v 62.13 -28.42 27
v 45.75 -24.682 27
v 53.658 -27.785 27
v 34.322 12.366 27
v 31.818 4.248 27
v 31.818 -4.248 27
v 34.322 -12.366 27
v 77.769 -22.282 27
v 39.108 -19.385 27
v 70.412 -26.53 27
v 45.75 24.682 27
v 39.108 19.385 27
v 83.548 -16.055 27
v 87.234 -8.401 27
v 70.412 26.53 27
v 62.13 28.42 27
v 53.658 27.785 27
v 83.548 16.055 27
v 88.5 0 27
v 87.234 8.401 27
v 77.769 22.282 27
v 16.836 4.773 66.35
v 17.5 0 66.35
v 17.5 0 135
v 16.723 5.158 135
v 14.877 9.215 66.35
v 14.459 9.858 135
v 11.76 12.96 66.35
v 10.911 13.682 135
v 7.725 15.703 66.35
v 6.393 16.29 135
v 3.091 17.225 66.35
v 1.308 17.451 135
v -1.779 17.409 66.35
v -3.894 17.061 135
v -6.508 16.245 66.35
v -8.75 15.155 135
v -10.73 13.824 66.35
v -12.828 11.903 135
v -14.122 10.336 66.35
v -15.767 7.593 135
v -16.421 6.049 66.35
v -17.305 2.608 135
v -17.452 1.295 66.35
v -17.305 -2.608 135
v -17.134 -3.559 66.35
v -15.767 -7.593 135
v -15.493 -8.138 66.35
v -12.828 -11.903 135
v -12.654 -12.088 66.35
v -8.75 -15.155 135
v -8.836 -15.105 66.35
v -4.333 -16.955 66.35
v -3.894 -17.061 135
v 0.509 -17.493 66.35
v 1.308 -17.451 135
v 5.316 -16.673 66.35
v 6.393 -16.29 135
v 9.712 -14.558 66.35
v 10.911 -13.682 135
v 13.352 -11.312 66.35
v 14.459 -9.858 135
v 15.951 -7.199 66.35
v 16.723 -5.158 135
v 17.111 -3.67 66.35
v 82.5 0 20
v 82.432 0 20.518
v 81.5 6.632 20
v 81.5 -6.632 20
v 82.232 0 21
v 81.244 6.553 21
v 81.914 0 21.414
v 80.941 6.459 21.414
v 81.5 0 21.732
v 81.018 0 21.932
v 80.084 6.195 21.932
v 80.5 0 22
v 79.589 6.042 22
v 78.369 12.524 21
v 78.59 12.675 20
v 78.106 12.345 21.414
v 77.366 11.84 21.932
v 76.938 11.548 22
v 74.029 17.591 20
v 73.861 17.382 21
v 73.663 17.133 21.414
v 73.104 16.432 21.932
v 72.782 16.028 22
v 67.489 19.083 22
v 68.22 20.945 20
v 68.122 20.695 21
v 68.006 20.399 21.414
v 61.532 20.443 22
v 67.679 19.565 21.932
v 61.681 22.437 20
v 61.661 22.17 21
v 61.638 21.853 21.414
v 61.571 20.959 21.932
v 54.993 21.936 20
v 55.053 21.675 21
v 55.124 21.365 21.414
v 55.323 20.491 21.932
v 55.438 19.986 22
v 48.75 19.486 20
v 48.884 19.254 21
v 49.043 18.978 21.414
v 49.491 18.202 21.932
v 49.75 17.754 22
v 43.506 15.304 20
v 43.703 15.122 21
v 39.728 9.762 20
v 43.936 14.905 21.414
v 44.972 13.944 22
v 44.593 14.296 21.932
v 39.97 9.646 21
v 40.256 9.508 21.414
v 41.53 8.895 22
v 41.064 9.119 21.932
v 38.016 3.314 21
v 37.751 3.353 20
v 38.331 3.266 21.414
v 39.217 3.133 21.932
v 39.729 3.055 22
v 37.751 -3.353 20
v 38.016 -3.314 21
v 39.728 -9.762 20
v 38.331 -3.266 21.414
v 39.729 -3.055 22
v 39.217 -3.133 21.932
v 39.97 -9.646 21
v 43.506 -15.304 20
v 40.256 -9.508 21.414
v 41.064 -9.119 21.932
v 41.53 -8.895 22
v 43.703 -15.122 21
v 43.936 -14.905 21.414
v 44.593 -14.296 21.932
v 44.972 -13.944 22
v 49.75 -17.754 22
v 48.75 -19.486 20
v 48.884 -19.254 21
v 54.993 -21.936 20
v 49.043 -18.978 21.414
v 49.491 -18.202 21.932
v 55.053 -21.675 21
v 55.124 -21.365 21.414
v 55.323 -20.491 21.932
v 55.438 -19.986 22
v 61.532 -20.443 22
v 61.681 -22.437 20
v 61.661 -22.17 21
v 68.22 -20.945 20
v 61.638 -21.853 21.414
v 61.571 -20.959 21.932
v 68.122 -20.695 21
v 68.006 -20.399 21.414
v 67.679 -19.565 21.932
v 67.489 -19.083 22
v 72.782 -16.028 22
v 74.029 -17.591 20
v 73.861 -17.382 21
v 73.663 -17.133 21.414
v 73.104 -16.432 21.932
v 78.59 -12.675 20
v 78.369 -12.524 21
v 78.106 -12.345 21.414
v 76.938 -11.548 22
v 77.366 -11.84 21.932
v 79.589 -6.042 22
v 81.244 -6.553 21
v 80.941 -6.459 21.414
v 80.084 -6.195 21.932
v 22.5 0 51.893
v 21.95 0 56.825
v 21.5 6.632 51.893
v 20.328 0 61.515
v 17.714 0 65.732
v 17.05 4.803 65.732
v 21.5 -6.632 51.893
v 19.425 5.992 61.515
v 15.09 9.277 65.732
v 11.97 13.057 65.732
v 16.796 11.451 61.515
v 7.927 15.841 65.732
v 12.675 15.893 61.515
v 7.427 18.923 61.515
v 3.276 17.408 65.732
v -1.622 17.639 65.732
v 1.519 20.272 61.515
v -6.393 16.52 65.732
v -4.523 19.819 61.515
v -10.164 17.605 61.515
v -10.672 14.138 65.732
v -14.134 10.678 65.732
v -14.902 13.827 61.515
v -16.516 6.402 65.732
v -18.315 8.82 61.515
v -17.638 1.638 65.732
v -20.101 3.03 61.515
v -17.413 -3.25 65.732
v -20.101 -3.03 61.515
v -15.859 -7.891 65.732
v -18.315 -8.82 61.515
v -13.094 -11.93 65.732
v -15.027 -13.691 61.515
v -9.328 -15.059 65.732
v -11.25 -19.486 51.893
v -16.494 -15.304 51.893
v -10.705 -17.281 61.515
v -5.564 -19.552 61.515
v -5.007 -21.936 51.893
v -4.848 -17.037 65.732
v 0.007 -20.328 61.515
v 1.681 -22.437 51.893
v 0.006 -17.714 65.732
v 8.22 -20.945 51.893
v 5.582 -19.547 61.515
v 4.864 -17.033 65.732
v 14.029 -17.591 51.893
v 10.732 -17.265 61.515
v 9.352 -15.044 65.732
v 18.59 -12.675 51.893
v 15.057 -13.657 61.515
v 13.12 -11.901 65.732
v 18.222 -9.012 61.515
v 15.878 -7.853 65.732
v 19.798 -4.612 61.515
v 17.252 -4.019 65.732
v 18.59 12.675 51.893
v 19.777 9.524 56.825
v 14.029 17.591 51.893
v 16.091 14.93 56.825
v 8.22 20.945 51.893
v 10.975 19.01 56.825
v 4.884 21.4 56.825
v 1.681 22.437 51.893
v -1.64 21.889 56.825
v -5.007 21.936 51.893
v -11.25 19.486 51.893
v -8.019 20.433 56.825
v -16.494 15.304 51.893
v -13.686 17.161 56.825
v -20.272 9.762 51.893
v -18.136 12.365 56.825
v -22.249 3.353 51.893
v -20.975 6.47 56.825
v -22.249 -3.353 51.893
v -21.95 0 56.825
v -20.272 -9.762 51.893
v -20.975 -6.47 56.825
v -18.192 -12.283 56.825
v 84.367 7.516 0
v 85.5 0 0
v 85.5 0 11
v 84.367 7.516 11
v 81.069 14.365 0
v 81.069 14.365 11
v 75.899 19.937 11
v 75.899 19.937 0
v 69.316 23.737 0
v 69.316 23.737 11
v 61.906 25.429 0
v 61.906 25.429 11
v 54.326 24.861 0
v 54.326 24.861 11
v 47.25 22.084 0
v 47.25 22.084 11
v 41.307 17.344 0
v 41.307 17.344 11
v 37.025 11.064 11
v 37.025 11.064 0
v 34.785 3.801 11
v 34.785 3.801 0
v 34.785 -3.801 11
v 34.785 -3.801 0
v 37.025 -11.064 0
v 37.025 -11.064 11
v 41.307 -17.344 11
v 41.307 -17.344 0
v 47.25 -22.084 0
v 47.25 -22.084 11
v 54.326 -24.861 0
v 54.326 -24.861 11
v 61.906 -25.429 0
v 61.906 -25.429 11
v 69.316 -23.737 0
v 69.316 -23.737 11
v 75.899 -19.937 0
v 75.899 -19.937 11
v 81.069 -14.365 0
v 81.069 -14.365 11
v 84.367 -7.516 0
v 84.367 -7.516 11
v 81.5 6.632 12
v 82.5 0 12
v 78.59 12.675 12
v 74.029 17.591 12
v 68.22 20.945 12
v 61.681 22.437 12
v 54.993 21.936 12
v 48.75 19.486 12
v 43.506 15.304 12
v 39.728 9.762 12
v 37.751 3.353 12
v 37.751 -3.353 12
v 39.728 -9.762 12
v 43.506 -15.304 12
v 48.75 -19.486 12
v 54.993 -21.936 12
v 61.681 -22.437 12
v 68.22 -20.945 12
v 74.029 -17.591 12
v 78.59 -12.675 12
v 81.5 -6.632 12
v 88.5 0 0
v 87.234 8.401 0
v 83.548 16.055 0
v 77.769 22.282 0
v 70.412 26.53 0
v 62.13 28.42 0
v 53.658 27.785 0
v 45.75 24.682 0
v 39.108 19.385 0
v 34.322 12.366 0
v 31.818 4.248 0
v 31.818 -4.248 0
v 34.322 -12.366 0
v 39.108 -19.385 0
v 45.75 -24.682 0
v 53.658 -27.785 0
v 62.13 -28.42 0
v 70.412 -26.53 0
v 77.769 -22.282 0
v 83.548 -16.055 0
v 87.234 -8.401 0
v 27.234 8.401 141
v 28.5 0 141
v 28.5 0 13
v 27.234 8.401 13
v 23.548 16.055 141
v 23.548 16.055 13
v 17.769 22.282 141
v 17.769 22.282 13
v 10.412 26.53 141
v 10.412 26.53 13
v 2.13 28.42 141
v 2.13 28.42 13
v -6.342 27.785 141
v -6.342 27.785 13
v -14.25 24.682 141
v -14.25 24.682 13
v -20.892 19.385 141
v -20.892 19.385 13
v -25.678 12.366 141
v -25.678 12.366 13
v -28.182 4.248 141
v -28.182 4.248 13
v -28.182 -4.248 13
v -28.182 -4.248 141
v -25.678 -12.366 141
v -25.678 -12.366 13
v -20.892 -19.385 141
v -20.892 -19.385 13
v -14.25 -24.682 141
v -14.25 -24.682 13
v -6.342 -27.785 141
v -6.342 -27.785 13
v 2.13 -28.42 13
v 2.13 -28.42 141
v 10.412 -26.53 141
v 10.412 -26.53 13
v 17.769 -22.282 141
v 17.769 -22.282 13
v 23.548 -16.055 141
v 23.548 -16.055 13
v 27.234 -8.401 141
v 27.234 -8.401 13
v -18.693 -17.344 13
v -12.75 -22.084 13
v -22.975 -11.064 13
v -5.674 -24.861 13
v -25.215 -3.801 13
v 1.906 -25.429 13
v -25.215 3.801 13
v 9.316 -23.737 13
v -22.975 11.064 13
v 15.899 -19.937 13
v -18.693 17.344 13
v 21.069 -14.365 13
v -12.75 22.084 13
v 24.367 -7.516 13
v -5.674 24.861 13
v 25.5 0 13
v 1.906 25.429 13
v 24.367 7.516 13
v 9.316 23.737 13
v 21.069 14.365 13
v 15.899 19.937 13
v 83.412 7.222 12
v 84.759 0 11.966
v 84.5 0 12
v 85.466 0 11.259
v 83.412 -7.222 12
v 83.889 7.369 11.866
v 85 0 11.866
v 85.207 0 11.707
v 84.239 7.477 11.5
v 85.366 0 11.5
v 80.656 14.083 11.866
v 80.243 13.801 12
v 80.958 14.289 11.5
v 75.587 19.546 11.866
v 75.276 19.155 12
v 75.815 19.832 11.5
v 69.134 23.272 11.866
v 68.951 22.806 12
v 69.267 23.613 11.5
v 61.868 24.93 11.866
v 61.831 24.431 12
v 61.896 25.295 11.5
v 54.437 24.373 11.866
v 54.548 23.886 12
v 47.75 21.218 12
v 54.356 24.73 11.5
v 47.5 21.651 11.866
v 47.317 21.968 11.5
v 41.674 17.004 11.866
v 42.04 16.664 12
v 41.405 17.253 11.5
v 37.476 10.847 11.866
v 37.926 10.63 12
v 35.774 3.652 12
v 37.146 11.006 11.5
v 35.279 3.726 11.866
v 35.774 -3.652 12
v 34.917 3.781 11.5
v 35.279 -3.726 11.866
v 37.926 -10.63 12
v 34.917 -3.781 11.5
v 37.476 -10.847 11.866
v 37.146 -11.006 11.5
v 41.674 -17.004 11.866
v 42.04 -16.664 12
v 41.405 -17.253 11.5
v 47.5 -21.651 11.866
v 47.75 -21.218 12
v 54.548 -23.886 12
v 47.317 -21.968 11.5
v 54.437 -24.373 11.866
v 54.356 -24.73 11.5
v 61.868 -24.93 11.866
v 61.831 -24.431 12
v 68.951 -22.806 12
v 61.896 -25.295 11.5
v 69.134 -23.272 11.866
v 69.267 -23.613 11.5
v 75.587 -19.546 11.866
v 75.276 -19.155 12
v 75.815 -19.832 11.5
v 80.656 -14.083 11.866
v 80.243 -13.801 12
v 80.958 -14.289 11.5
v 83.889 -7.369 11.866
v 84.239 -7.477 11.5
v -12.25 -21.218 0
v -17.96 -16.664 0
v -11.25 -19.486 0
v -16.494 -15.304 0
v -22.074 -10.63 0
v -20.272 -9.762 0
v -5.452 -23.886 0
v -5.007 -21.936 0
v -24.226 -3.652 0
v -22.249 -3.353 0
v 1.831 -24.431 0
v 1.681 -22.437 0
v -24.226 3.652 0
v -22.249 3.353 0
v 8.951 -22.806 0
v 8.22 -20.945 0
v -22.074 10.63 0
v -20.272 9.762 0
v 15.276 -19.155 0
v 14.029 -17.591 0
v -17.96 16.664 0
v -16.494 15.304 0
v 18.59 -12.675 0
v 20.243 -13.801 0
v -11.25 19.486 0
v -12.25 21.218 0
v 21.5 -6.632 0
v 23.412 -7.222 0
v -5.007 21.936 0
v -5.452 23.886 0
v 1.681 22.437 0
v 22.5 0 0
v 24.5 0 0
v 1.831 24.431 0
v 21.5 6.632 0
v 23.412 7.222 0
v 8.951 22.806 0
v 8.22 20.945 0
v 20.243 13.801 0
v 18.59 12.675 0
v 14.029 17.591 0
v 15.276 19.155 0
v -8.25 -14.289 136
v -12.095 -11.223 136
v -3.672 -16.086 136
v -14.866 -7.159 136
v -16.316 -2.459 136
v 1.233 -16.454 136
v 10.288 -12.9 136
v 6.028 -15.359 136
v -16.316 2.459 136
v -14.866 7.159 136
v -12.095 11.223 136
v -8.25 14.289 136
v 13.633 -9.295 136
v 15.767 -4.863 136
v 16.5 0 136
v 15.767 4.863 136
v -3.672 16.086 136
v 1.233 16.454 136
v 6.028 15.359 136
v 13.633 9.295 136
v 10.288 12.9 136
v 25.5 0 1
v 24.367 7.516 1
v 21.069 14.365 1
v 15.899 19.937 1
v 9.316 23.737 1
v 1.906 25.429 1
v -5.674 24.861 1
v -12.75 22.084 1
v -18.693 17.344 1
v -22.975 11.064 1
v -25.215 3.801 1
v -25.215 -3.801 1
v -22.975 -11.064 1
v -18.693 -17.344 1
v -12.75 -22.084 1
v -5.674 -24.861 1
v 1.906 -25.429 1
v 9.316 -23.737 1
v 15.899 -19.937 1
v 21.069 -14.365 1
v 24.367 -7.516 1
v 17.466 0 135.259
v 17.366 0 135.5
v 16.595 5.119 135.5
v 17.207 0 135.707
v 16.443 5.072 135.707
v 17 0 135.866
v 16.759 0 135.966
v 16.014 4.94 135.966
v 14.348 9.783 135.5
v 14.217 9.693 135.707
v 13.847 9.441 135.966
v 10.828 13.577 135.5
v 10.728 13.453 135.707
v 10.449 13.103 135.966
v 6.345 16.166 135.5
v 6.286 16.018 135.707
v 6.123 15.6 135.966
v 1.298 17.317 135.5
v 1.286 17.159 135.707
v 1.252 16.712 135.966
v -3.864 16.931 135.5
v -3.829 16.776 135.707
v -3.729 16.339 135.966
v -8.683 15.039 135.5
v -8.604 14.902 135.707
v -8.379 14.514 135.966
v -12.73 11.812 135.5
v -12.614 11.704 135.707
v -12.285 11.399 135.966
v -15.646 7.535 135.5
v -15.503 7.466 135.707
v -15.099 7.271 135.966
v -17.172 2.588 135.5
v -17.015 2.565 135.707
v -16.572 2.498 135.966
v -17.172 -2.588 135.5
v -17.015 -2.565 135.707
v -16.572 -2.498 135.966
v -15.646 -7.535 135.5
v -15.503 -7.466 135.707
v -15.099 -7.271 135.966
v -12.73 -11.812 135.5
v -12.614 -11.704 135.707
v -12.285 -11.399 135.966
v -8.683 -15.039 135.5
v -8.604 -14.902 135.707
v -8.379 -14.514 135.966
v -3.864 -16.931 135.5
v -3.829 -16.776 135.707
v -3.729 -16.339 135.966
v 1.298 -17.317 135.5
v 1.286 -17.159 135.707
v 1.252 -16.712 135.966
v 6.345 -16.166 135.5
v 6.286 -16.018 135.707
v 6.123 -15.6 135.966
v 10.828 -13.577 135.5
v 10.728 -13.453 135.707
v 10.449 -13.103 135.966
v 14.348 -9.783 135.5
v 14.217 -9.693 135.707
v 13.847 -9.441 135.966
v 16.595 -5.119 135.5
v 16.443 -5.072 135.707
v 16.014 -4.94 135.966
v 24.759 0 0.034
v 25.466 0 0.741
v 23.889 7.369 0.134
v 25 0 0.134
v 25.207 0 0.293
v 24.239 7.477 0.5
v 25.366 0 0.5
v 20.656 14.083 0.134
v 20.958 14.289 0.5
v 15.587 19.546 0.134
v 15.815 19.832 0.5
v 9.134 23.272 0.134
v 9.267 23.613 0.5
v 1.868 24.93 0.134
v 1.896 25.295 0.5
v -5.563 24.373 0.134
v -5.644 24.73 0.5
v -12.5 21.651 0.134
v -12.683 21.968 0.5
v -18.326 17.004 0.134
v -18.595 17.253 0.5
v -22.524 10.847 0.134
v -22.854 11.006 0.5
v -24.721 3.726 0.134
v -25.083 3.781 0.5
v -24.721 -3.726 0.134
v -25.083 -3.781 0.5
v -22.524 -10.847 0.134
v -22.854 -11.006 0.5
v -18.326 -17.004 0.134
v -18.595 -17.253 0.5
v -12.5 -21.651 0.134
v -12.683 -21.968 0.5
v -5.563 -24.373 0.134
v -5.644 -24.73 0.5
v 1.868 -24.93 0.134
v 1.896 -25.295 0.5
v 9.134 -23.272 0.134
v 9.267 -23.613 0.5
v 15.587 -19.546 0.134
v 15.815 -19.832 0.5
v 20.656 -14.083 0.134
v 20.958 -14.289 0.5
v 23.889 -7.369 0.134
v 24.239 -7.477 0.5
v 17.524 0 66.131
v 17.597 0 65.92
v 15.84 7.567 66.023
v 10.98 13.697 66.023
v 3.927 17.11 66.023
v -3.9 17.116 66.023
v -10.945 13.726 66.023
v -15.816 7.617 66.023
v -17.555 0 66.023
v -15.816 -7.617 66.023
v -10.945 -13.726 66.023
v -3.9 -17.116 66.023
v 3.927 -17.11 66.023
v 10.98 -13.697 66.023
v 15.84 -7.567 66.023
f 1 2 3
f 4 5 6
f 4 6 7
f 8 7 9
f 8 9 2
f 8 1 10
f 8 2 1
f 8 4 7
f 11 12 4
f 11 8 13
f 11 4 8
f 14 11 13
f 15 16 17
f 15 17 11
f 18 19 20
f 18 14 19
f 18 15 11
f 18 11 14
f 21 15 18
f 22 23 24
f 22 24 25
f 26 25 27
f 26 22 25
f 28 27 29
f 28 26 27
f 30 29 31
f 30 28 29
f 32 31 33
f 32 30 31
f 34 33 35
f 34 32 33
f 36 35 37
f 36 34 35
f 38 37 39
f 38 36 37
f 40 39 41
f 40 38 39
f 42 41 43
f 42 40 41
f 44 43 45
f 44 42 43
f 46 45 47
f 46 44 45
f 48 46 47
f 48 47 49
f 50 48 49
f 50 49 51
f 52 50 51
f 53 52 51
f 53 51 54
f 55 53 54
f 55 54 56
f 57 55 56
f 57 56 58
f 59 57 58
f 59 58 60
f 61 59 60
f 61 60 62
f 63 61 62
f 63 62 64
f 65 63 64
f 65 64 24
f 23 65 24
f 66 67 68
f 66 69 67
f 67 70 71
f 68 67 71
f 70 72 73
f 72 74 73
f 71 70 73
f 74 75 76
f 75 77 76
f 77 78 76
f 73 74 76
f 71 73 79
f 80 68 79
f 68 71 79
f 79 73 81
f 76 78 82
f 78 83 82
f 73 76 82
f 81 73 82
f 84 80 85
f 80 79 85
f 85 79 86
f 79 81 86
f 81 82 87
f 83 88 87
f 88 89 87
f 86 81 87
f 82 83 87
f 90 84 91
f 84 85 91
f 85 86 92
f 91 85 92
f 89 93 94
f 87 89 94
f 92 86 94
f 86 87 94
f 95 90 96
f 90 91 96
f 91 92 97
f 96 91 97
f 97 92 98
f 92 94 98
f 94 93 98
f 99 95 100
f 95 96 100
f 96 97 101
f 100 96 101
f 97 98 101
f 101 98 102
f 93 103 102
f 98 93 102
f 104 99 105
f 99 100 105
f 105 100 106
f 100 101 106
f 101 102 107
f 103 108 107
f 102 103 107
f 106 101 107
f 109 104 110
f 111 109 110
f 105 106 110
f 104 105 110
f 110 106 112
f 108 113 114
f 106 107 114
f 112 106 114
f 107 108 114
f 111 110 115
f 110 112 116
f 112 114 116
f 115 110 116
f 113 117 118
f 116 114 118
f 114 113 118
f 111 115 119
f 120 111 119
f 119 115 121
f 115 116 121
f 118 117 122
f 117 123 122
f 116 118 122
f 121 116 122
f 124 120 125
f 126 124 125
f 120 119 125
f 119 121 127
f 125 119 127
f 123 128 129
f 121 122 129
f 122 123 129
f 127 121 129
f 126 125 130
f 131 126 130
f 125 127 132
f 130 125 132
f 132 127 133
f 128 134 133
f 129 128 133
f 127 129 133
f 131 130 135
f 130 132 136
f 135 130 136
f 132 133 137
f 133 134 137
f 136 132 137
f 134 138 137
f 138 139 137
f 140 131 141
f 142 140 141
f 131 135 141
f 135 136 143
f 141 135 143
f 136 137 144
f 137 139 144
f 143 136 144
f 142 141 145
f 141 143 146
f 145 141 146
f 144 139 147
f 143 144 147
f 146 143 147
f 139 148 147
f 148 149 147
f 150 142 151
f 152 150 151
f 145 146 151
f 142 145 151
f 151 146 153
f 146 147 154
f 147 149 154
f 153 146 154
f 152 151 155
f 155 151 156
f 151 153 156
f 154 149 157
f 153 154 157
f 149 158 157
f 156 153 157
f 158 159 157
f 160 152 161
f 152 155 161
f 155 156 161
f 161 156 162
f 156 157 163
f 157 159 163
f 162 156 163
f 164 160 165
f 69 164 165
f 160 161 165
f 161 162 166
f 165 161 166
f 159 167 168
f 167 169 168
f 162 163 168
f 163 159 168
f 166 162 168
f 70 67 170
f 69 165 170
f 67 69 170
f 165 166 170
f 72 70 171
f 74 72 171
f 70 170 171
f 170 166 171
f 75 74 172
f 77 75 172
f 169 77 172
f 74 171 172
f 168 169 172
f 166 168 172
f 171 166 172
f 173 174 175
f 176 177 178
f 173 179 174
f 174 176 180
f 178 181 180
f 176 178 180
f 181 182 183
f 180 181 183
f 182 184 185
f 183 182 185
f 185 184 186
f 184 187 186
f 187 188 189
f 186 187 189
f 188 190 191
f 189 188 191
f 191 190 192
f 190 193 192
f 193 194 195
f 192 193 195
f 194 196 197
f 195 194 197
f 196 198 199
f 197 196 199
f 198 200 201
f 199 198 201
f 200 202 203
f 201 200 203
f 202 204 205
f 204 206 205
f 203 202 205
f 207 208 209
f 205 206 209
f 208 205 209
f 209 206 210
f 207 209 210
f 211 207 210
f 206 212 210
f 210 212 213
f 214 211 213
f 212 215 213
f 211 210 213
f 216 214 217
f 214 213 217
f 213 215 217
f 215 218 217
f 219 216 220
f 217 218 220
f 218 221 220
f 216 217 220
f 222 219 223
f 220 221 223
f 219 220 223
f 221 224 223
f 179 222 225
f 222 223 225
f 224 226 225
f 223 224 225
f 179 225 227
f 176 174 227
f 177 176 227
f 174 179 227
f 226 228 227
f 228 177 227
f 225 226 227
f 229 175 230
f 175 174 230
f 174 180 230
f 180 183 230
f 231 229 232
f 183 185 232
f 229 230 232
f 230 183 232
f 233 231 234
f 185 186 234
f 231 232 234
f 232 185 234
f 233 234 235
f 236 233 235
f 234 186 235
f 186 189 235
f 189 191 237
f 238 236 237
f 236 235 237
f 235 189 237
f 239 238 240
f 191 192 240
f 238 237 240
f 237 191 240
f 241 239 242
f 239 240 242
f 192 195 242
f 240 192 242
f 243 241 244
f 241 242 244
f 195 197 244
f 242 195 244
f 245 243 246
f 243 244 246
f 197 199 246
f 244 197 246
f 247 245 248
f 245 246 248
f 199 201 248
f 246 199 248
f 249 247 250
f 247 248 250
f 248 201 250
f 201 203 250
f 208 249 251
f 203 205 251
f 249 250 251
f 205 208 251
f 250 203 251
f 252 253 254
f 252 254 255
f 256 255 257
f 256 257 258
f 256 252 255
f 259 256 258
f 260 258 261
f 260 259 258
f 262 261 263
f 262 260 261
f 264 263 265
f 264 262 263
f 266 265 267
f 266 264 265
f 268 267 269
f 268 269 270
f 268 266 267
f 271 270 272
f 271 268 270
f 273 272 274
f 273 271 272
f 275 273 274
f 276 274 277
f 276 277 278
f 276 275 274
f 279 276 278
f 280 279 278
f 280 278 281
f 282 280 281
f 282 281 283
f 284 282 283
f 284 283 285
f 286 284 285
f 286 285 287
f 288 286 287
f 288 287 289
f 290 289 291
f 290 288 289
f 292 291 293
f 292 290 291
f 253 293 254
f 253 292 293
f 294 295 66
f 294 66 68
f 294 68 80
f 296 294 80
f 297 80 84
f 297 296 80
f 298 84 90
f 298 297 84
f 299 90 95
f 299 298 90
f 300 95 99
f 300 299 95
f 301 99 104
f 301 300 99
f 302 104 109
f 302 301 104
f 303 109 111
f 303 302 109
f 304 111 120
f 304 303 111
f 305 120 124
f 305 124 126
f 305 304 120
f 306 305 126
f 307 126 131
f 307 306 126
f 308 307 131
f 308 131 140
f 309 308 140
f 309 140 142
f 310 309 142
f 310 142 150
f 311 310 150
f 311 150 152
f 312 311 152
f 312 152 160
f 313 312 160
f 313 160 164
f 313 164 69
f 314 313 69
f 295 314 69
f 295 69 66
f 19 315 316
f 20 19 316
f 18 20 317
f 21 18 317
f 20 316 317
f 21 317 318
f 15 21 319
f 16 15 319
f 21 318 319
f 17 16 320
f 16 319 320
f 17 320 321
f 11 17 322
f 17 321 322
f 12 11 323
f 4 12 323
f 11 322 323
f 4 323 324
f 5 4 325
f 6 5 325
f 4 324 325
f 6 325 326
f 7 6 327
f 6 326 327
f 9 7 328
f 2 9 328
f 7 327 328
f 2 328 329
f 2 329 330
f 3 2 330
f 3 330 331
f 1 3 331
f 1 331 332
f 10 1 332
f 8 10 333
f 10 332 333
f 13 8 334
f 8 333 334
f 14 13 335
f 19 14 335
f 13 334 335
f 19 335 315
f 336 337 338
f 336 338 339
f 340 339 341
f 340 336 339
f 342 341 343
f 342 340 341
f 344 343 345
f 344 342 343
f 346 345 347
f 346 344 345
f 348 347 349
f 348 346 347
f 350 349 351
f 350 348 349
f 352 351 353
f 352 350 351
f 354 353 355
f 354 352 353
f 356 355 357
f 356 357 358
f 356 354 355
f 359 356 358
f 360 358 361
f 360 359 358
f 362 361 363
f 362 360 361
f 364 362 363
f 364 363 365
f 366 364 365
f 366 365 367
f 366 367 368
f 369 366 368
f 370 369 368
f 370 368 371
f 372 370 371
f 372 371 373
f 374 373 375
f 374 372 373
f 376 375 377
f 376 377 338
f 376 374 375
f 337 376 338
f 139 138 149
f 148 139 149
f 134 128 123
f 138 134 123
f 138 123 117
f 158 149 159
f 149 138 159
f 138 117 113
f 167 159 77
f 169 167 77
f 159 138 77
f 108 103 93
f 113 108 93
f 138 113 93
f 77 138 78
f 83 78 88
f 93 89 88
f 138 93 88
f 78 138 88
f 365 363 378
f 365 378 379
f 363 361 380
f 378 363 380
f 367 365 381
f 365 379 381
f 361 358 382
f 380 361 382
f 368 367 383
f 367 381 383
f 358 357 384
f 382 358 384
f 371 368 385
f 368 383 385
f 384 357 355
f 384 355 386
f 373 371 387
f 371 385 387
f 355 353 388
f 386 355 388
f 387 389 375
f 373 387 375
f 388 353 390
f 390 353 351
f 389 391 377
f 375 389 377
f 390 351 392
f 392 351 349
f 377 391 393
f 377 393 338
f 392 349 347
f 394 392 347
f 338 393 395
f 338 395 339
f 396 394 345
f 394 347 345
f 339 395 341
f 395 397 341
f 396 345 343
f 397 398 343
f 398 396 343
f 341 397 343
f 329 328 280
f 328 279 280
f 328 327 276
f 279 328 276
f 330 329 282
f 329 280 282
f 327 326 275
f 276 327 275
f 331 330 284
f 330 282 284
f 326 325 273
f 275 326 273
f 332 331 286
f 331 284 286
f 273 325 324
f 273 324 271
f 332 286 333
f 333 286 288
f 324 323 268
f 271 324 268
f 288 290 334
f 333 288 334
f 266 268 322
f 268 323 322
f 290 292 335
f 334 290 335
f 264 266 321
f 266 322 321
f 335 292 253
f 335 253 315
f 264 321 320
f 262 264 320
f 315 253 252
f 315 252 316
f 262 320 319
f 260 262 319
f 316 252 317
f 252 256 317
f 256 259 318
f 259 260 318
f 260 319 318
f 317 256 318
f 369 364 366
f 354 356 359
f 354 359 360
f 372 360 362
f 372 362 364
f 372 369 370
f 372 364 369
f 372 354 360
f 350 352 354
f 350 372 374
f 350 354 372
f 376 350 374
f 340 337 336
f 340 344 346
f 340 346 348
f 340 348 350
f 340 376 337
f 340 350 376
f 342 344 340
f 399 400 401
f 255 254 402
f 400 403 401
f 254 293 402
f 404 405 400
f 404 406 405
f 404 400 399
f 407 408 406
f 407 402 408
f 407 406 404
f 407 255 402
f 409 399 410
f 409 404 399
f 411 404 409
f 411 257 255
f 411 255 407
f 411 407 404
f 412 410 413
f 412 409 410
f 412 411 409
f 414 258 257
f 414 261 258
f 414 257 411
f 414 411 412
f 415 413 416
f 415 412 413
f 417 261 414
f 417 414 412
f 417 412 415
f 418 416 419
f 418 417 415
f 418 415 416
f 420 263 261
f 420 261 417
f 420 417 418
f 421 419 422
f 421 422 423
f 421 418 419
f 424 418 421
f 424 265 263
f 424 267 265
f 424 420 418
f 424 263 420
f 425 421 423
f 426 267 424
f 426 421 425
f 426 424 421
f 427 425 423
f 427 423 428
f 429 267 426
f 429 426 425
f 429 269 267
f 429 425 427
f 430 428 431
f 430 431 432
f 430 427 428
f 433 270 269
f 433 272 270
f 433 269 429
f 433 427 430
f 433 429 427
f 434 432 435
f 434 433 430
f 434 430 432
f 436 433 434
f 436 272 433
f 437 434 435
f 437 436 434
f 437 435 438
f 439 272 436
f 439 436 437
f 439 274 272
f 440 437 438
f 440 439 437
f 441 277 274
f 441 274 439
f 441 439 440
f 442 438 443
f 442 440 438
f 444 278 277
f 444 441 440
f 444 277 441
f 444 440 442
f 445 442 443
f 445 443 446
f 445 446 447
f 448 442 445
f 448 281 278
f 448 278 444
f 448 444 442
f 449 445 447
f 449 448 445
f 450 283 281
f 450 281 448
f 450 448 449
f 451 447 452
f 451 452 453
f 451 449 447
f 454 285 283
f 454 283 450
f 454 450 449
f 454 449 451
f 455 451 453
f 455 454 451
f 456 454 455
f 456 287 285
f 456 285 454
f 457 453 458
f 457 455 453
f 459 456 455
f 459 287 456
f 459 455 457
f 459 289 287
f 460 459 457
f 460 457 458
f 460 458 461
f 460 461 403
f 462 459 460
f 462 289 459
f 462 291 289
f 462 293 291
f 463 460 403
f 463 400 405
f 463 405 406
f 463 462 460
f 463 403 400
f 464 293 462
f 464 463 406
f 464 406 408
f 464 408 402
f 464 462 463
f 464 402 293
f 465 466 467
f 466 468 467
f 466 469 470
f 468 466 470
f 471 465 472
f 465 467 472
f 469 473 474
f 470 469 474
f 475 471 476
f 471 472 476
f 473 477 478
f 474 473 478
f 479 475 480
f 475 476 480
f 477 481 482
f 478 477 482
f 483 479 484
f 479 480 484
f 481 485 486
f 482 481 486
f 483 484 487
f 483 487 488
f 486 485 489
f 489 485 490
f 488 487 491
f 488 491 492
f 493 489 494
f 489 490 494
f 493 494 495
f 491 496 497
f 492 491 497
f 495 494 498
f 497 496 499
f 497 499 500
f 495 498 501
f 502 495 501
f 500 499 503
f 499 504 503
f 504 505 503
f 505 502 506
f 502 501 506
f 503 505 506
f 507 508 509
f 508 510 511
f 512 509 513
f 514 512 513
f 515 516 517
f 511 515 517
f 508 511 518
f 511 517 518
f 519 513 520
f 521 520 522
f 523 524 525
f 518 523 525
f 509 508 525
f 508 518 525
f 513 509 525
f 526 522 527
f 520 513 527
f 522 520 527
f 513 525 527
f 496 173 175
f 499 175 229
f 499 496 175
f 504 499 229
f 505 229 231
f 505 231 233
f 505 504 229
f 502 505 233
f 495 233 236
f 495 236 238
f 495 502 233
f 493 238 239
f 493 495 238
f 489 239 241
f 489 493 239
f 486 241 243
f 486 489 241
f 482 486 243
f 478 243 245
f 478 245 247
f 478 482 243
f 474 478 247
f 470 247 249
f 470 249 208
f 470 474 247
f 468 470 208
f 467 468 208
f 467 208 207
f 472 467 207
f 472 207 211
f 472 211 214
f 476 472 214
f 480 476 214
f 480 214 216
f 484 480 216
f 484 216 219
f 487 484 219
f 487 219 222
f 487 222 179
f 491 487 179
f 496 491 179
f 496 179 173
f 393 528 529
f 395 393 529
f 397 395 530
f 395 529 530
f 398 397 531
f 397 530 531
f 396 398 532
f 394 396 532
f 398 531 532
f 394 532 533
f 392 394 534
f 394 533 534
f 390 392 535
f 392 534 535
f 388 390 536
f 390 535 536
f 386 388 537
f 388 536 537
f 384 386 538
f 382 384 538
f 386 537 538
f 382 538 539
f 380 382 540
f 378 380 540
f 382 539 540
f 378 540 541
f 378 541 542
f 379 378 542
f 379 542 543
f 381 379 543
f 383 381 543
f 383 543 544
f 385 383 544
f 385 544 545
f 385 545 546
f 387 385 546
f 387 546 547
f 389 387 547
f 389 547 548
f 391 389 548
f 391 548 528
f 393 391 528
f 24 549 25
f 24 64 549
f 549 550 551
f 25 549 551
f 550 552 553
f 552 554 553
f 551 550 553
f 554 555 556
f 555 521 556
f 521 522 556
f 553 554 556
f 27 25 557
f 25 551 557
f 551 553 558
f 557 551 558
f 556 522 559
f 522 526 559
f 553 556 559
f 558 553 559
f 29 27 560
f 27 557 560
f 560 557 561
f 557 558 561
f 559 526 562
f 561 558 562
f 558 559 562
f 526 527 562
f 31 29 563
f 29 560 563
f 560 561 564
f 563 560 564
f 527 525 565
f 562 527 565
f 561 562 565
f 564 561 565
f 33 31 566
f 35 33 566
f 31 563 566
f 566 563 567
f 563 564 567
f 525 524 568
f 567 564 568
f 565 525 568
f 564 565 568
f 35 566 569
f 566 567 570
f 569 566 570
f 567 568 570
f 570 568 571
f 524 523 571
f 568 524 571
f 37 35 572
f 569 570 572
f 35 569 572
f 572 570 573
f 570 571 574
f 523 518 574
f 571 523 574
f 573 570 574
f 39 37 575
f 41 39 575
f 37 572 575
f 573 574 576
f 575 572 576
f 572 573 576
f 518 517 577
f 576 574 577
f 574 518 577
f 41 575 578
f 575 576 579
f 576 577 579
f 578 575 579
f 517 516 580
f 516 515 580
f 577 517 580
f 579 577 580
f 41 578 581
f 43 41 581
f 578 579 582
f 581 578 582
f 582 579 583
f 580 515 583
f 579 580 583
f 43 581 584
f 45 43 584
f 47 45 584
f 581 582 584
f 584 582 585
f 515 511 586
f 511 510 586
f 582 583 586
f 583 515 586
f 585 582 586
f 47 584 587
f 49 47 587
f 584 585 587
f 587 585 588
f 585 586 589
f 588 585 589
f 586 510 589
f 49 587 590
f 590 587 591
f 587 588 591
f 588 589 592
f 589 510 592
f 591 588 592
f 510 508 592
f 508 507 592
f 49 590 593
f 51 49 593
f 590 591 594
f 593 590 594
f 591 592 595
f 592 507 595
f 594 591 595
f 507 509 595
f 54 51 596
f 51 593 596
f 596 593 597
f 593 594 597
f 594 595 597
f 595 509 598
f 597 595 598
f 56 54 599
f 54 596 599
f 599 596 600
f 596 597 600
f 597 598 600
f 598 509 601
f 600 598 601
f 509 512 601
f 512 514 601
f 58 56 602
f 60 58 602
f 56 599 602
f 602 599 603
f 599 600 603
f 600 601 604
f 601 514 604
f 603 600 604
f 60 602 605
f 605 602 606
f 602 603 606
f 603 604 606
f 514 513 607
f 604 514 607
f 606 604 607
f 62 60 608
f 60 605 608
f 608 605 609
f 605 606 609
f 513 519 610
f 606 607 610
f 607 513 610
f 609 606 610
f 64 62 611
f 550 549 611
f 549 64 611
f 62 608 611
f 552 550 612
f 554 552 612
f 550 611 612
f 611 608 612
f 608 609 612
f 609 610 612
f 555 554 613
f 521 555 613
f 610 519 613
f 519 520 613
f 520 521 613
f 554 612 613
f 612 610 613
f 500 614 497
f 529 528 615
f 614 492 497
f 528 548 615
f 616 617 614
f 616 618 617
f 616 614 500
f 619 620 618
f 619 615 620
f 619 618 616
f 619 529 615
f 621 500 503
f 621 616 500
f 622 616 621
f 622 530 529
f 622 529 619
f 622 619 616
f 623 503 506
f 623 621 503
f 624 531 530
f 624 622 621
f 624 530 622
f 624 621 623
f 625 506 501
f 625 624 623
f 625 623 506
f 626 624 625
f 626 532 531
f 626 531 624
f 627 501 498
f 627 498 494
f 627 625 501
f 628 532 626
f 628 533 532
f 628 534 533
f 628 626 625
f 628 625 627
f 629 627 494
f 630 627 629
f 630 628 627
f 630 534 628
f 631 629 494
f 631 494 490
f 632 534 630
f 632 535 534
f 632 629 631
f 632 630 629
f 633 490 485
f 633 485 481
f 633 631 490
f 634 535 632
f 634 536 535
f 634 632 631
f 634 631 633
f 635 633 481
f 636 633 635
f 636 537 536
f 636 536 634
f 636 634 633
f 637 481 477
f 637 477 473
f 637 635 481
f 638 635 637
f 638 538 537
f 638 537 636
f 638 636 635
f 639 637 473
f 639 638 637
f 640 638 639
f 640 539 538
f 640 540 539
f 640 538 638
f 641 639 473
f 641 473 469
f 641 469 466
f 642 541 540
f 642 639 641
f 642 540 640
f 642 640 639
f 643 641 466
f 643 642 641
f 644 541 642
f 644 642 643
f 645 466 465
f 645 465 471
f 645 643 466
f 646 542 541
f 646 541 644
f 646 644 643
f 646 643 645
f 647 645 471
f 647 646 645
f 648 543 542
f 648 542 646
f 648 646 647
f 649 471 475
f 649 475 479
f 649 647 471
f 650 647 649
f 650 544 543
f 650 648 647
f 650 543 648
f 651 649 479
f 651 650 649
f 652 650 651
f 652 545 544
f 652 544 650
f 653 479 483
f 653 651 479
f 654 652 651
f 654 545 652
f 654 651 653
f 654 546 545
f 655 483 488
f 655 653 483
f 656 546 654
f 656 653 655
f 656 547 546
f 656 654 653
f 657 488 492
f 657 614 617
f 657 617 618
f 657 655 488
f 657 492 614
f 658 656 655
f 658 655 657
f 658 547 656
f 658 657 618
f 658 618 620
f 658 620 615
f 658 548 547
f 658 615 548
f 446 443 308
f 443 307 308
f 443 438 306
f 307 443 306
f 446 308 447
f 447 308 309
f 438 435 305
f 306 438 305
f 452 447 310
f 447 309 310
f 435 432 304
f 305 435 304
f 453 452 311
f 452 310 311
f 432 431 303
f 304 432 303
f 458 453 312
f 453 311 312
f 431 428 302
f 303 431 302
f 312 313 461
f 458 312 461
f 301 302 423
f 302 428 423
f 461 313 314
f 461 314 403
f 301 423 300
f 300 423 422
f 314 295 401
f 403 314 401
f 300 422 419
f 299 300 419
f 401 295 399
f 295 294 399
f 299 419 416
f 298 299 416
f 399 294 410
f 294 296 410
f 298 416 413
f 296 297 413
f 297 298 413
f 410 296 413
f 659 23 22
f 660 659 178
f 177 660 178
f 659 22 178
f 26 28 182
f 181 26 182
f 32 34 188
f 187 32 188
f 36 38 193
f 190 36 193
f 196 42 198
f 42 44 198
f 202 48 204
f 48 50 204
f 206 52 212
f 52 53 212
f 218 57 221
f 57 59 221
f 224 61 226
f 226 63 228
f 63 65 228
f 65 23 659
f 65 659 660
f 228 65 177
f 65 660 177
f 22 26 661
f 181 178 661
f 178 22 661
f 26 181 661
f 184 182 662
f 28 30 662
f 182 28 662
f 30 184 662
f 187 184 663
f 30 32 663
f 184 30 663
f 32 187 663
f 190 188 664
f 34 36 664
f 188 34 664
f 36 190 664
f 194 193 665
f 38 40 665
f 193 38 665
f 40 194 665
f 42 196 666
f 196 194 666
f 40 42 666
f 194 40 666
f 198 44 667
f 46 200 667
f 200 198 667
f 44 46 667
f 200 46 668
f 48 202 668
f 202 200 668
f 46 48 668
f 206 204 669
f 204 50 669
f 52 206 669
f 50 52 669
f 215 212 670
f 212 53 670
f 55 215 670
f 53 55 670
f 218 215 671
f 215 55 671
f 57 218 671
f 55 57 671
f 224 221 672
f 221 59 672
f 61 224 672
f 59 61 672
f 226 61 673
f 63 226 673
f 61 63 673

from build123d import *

# Parameters (mm, degrees)
F0_R      = 25.5
F0_R_2    = 22.5
F0_R_3    = 17.5
F1_DEPTH  = 141
F2_DEPTH  = 136
F3_DEPTH  = 66
F5_R      = 1
F6_R      = 1
F7_R      = 1
F8_R      = 28.5
F8_R_2    = 25.5
F8_R_3    = 22.5
F9_DEPTH  = 27
F10_DEPTH = 22
F11_DEPTH = 12
F12_R     = 2
F13_R     = 1
F14_R     = 28.5
F14_R_2   = 25.5
F15_DEPTH = 128


# Not quite as in the source:
# - a fillet or chamfer that OpenCascade refuses, or shapes differently, is made with other operations: its cross-section is extruded or revolved along the edge and cut away or added


with BuildPart() as f1:
    # F0 (on Top) → F1 (new body)
    with BuildSketch(Plane.XY):
        Circle(F0_R)
        Circle(F0_R_2, mode=Mode.SUBTRACT)
        Circle(F0_R_2)
        Circle(F0_R_3, mode=Mode.SUBTRACT)
        Circle(F0_R_3)
    extrude(amount=F1_DEPTH)

    # F0 (on Top) → F2 (cut)
    with BuildSketch(Plane.XY):
        Circle(F0_R_3)
    extrude(amount=F2_DEPTH, mode=Mode.SUBTRACT)

    # F0 (on Top) → F3 (cut)
    with BuildSketch(Plane.XY):
        Circle(F0_R_2)
        Circle(F0_R_3, mode=Mode.SUBTRACT)
    extrude(amount=F3_DEPTH, mode=Mode.SUBTRACT)

    # F4: fillet of radius 22.4 on 1 edges, made by hand

    # F4_s1 → F4_t2 (revolve)
    with BuildSketch(Plane.XZ):
        with BuildLine():
            ThreePointArc((22.5, 51.8932640203), (21.2130291526, 59.3765787939), (17.5, 66))
            Line((17.5, 66), (22.5, 66))
            Line((22.5, 66), (22.5, 51.8932640203))
        make_face()
    revolve(axis=Axis((0, 0, 66), (0, 0, 1)))

    # F5
    f5_edges = [f1.edges().sort_by_distance(p)[0] for p in [
        (-17.5, 0, 136),
    ]]
    fillet(f5_edges, radius=F5_R)

    # F6
    f6_edges = [f1.edges().sort_by_distance(p)[0] for p in [
        (-17.5, 0, 66),
    ]]
    fillet(f6_edges, radius=F6_R)

    # F7
    f7_edges = [f1.edges().sort_by_distance(p)[0] for p in [
        (-25.5, 0, 0),
    ]]
    fillet(f7_edges, radius=F7_R)

    # F14 (on face) → F15 (join)
    with BuildSketch(Plane.XY.offset(141)):
        Circle(F14_R)
        Circle(F14_R_2, mode=Mode.SUBTRACT)
    extrude(amount=-F15_DEPTH)


with BuildPart() as f9:
    # F8 (on Top) → F9 (new body)
    with BuildSketch(Plane.XY):
        with Locations((60, 0)):
            Circle(F8_R)
        with Locations((60, 0)):
            Circle(F8_R_2, mode=Mode.SUBTRACT)
        with Locations((60, 0)):
            Circle(F8_R_2)
        with Locations((60, 0)):
            Circle(F8_R_3, mode=Mode.SUBTRACT)
        with Locations((60, 0)):
            Circle(F8_R_3)
    extrude(amount=F9_DEPTH)

    # F8 (on Top) → F10 (cut)
    with BuildSketch(Plane.XY):
        with Locations((60, 0)):
            Circle(F8_R_3)
    extrude(amount=F10_DEPTH, mode=Mode.SUBTRACT)

    # F8 (on Top) → F11 (cut)
    with BuildSketch(Plane.XY):
        with Locations((60, 0)):
            Circle(F8_R_2)
        with Locations((60, 0)):
            Circle(F8_R_3, mode=Mode.SUBTRACT)
    extrude(amount=F11_DEPTH, mode=Mode.SUBTRACT)

    # F12
    f12_edges = [f9.edges().sort_by_distance(p)[0] for p in [
        (37.5, 0, 22),
    ]]
    fillet(f12_edges, radius=F12_R)

    # F13
    f13_edges = [f9.edges().sort_by_distance(p)[0] for p in [
        (34.5, 0, 12),
    ]]
    fillet(f13_edges, radius=F13_R)


solid = Compound([f1.part, f9.part])
